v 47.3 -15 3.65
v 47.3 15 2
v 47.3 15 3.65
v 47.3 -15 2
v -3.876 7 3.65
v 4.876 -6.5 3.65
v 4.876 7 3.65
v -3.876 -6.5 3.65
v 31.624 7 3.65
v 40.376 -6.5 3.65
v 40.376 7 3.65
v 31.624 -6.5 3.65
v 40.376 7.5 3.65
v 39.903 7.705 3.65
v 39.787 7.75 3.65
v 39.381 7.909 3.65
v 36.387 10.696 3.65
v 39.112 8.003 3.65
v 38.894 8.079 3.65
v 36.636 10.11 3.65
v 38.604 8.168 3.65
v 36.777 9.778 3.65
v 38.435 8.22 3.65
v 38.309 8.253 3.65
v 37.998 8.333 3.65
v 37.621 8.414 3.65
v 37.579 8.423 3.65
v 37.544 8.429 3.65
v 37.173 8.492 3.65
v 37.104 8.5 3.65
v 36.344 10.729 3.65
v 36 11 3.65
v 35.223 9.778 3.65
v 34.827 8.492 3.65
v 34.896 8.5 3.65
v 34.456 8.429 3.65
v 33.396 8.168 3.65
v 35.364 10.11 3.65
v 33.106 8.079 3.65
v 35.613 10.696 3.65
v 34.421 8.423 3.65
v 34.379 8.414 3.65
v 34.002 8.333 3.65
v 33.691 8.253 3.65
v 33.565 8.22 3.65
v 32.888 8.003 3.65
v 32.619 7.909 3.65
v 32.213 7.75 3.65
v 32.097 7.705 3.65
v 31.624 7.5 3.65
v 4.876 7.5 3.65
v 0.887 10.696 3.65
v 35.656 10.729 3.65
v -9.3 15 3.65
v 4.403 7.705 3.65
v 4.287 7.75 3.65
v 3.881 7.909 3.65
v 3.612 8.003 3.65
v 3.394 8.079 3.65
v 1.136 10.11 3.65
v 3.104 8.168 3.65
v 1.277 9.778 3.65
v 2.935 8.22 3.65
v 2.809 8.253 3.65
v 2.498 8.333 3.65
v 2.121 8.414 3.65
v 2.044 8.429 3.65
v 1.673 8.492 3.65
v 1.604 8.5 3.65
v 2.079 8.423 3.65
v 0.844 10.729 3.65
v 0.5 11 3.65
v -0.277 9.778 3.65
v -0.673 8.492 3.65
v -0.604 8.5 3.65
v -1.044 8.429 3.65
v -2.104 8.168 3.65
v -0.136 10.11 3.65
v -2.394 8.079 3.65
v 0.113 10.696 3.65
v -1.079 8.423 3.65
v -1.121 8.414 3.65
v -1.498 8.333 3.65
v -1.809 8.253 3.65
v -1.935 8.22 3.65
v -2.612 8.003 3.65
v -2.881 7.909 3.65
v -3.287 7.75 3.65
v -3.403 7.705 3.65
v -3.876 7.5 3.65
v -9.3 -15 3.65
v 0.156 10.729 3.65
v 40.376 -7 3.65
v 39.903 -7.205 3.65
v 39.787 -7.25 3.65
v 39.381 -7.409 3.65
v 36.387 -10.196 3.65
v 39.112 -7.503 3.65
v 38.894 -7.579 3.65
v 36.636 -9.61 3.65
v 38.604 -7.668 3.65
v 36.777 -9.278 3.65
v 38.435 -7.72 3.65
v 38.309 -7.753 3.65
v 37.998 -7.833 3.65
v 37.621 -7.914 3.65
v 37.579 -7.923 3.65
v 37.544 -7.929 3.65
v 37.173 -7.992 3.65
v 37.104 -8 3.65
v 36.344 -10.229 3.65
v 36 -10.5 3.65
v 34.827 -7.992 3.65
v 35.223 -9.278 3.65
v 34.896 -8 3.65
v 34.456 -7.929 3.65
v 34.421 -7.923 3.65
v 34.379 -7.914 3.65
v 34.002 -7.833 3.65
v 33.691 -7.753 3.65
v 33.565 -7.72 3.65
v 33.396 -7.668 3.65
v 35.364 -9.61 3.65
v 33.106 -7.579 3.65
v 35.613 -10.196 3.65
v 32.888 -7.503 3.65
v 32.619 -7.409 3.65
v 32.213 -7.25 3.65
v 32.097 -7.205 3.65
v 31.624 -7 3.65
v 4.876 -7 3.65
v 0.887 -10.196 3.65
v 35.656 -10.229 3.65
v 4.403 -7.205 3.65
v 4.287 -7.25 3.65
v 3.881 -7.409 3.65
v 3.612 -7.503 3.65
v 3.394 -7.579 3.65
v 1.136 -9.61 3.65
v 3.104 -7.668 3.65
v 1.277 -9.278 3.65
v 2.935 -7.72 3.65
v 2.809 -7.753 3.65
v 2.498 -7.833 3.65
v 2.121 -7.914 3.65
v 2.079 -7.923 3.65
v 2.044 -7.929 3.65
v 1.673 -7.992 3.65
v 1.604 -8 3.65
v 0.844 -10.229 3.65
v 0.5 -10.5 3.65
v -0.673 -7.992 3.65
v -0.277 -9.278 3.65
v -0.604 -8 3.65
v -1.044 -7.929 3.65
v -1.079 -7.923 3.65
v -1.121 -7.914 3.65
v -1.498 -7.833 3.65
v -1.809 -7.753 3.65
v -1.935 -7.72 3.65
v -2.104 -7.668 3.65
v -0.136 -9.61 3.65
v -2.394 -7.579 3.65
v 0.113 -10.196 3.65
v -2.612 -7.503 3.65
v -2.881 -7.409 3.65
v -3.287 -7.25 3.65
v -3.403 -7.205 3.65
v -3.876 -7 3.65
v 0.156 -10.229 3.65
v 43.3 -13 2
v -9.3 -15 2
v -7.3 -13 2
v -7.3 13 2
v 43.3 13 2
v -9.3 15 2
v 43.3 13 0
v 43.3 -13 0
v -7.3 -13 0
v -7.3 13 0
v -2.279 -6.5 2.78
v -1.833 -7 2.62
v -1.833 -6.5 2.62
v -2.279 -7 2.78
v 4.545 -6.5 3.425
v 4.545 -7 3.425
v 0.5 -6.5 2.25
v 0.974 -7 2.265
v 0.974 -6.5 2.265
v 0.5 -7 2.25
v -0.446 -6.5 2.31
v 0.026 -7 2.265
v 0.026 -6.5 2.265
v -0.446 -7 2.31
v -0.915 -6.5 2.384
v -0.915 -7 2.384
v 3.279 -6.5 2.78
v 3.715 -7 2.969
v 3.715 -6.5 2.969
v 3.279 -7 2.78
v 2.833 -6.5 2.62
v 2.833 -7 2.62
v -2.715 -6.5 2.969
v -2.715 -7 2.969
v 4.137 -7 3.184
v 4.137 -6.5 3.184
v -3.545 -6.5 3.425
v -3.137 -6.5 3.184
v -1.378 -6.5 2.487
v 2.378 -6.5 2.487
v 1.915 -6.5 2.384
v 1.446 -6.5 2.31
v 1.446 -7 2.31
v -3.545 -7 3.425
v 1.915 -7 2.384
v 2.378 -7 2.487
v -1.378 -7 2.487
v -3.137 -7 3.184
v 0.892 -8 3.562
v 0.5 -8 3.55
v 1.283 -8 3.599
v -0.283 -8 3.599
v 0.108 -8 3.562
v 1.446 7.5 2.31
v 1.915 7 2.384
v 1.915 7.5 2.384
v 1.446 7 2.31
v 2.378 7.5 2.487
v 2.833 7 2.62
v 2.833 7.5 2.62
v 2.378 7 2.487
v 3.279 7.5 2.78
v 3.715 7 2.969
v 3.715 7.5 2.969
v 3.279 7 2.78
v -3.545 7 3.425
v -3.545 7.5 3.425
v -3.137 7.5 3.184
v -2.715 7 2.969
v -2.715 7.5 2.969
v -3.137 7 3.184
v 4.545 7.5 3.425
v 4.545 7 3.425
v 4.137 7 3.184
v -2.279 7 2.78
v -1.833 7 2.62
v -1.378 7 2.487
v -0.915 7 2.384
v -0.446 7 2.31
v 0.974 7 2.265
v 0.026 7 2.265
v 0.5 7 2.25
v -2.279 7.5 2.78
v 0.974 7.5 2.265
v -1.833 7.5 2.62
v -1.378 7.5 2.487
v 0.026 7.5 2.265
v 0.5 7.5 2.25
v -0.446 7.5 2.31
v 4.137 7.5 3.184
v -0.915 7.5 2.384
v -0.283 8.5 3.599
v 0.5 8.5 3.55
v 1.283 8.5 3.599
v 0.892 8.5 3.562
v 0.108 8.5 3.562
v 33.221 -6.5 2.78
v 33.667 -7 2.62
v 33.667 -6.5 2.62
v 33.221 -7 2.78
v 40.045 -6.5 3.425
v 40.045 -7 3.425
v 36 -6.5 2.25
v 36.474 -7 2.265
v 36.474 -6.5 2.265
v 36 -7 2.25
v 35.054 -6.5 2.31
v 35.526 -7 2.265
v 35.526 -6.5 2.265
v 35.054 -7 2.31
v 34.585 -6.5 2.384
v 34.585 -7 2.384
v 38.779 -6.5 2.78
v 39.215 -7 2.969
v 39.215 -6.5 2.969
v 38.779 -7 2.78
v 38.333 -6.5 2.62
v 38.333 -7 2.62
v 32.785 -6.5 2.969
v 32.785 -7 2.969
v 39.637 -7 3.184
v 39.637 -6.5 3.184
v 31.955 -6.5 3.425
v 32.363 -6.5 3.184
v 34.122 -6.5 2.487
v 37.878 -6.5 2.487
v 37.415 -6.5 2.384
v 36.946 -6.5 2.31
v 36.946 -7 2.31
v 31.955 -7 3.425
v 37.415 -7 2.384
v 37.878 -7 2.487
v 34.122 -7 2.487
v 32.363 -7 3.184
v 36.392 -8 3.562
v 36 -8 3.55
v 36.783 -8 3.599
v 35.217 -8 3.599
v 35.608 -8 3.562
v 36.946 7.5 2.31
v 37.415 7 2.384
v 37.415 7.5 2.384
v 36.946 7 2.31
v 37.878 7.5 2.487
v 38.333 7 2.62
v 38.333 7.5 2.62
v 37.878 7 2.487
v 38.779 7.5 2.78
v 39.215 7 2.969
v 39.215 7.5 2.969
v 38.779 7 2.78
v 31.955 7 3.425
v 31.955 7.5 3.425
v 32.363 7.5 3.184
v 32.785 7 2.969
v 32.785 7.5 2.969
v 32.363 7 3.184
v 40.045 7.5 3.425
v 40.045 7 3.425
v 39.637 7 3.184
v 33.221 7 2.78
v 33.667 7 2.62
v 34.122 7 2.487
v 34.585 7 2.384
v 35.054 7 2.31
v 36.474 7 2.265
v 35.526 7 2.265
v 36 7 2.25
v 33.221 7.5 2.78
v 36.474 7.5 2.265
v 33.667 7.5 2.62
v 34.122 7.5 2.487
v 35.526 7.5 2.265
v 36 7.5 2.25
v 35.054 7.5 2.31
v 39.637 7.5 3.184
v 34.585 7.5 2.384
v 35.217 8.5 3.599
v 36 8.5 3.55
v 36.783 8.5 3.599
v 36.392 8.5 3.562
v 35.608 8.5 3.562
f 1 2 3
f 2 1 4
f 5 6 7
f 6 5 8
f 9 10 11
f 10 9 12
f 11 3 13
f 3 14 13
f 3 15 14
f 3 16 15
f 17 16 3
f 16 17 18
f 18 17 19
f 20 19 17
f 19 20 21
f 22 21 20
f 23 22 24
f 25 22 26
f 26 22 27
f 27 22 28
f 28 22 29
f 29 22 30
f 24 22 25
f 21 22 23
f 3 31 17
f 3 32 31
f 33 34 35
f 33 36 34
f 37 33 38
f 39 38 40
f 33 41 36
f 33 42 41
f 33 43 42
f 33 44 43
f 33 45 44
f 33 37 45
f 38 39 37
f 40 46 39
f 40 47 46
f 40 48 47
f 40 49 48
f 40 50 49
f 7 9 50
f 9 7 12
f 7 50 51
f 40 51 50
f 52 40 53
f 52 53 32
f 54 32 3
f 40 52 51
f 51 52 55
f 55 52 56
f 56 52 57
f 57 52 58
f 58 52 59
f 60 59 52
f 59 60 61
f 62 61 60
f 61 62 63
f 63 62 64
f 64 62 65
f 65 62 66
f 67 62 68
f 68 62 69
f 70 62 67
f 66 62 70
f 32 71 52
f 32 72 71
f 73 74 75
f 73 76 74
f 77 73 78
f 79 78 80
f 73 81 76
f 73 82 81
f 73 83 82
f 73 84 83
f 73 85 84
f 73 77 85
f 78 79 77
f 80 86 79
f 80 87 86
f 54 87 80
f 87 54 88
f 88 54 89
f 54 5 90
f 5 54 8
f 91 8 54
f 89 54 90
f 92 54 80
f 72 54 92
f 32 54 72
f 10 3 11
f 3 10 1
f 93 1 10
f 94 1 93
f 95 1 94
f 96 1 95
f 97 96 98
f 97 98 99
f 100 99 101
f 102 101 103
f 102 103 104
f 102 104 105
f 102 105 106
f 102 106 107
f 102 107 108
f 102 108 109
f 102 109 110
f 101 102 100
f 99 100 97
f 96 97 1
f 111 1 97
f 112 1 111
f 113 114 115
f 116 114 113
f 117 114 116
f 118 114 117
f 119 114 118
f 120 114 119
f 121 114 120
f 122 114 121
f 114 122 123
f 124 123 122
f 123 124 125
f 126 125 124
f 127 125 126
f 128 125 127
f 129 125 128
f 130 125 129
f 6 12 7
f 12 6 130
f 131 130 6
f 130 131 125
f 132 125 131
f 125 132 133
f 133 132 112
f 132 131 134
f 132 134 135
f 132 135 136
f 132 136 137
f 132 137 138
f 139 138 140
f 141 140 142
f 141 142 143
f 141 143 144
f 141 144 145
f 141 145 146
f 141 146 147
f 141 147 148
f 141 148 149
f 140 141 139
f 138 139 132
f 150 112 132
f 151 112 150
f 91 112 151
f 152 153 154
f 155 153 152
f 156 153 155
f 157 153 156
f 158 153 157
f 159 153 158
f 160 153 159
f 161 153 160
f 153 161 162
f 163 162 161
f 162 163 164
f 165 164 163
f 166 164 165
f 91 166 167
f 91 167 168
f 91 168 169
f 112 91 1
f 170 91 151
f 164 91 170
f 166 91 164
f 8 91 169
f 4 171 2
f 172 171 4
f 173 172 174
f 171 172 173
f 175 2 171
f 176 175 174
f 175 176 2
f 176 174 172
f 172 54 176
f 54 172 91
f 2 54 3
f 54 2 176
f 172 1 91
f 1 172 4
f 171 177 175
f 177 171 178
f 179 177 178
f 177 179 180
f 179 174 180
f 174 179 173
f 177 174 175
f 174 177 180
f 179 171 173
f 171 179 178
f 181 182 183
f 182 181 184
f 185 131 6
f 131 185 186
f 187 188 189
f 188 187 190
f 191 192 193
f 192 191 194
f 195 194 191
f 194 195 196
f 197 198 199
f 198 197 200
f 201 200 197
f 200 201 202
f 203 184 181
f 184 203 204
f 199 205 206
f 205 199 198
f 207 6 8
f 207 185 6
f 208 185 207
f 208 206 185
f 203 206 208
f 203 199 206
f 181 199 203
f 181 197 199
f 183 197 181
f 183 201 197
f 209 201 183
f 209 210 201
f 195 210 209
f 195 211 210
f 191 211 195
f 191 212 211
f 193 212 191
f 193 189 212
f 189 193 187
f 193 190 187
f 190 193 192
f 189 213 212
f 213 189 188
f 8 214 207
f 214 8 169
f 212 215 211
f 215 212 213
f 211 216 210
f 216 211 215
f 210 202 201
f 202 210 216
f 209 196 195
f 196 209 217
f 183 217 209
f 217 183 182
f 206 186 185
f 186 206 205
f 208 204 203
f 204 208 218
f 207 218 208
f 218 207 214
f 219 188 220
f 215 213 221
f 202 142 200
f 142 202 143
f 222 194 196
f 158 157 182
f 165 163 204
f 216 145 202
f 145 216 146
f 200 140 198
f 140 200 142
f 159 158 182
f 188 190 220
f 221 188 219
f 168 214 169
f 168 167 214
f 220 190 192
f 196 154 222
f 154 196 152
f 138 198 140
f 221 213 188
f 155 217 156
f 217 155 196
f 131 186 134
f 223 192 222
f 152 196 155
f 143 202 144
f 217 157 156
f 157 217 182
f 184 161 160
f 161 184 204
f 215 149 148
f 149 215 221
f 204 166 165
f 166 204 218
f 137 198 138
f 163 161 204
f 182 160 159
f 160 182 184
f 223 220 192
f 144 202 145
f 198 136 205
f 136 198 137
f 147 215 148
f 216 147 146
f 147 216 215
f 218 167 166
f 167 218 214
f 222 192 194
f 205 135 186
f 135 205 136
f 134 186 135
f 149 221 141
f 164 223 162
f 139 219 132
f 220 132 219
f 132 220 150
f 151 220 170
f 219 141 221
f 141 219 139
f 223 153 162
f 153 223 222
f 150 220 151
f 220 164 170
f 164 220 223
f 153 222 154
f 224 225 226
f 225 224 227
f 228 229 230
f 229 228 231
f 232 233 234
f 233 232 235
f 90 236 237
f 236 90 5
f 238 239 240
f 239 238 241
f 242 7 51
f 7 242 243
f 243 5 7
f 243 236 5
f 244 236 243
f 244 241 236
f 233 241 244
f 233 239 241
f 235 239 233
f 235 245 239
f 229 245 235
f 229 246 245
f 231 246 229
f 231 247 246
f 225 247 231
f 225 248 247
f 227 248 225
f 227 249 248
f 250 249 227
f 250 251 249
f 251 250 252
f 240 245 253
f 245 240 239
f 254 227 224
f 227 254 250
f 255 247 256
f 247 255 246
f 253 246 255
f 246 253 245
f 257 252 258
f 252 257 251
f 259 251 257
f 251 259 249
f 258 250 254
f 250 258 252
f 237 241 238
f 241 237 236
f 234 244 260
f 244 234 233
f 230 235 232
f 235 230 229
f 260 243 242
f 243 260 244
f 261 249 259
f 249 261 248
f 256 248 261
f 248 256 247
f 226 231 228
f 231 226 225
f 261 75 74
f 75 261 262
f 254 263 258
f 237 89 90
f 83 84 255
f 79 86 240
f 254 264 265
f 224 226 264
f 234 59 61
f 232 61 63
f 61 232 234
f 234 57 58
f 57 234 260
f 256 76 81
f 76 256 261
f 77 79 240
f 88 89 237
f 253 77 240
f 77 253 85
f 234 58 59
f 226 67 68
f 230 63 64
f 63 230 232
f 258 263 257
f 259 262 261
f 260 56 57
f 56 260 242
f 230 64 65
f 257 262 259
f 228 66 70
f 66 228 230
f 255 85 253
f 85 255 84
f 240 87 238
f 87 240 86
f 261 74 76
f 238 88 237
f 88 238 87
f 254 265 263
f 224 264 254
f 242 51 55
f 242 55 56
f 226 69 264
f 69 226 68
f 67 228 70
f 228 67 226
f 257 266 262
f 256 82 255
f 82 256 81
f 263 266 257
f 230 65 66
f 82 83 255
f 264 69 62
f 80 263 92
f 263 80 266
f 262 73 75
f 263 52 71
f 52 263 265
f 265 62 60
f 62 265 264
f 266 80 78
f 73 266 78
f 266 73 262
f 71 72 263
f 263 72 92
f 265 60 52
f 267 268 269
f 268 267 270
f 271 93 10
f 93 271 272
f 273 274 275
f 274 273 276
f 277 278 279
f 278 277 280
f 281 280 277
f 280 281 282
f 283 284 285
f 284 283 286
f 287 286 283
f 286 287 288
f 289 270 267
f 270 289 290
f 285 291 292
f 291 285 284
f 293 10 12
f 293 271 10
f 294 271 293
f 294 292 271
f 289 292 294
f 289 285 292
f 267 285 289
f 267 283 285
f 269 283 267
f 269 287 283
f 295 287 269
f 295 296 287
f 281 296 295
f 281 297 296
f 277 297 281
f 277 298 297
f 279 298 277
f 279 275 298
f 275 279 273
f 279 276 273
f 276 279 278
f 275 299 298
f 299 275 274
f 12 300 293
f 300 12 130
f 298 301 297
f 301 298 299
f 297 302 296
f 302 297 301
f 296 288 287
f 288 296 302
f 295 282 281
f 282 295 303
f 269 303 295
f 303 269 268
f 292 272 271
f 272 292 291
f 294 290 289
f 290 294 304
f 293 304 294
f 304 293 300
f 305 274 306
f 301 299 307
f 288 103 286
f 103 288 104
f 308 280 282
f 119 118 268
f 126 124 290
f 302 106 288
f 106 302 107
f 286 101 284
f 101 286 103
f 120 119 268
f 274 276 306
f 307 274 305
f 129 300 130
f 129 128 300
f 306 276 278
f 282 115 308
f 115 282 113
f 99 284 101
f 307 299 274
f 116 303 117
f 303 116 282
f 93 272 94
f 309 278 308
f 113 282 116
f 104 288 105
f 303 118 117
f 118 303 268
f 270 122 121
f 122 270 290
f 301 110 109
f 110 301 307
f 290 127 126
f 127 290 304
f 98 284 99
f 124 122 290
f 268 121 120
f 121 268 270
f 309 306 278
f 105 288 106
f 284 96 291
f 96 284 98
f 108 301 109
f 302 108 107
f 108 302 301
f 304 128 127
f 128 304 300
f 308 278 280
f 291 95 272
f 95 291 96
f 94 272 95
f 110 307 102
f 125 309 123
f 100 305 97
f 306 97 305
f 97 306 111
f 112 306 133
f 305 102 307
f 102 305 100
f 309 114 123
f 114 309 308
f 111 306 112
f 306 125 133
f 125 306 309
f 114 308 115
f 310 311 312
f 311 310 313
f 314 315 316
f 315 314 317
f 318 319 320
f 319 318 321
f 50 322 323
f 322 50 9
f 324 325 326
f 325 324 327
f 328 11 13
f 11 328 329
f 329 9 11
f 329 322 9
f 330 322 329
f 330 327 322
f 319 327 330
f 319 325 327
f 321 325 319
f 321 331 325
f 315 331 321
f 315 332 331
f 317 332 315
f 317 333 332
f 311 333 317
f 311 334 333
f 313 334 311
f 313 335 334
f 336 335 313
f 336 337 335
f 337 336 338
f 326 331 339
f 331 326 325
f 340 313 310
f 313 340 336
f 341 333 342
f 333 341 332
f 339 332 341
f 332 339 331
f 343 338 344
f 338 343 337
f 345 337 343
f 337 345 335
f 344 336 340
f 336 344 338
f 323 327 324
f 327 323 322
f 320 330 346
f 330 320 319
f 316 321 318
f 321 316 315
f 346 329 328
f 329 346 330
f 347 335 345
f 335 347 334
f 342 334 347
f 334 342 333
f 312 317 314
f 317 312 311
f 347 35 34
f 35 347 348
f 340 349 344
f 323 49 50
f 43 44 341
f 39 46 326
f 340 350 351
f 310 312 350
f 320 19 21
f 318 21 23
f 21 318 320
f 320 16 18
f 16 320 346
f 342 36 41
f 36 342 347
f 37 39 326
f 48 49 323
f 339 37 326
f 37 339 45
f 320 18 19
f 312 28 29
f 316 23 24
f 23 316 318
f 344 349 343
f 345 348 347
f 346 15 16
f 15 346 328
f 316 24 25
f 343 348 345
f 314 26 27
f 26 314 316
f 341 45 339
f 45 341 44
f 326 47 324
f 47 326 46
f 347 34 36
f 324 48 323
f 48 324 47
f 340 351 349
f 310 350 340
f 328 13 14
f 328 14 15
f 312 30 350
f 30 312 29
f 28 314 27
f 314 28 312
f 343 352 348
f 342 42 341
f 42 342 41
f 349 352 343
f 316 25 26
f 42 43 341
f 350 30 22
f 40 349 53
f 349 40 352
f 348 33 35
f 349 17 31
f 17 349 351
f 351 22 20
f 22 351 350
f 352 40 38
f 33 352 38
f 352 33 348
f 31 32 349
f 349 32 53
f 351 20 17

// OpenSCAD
raddurchmesser=12;
radinnendurchmesser=11.8;
achsendurchmesser=1.3;
laufkranzdicke = 1;
laufkranzhoehe = 1.3;
radgesamthoehe = laufkranzhoehe*2 + raddurchmesser;
radabstand = 14;
laufflaeche=2;
spiel=0.5;
$fn=100;
module rad()
{
    union()
    {
        //union(){
        cylinder(d=radgesamthoehe+spiel,h=spiel);
        translate([0,0,spiel]) cylinder(d1=radgesamthoehe+spiel,d2=raddurchmesser+spiel,h=laufkranzdicke);
        translate([0,0,laufkranzdicke+spiel]) cylinder(d1=raddurchmesser+spiel,d2=radinnendurchmesser+spiel,h=laufflaeche+spiel);
        //cylinder(d=3.2,h=18);
    }

}

module achse()
{
   translate([0,(radabstand-spiel)/2,0])rotate([90,0,0])cylinder(d=achsendurchmesser,h=radabstand);
   translate([0,-(radabstand-spiel*2)/2,0])rotate([90,0,0])rad();
   translate([0,radabstand/2,0])rotate([-90,0,0])rad();
   
}
ueberstand=2;
rotate([0,0,0]){
difference()
{
   union()
    {
        translate([-radgesamthoehe/2,-13,0])
        {
            translate([-ueberstand,-ueberstand,2])
            {
                cube([38+radgesamthoehe+2*ueberstand,26+ueberstand*2,radgesamthoehe/4-2]);
            }
            cube([36+radgesamthoehe,26,radgesamthoehe/4]);
        }

    };
    translate([spiel,0,2.5])
    {
        translate([0,0,radgesamthoehe/2]){
          #achse();
        }
        translate([36-spiel,0,radgesamthoehe/2]){
           achse();
        }
}

}
}
